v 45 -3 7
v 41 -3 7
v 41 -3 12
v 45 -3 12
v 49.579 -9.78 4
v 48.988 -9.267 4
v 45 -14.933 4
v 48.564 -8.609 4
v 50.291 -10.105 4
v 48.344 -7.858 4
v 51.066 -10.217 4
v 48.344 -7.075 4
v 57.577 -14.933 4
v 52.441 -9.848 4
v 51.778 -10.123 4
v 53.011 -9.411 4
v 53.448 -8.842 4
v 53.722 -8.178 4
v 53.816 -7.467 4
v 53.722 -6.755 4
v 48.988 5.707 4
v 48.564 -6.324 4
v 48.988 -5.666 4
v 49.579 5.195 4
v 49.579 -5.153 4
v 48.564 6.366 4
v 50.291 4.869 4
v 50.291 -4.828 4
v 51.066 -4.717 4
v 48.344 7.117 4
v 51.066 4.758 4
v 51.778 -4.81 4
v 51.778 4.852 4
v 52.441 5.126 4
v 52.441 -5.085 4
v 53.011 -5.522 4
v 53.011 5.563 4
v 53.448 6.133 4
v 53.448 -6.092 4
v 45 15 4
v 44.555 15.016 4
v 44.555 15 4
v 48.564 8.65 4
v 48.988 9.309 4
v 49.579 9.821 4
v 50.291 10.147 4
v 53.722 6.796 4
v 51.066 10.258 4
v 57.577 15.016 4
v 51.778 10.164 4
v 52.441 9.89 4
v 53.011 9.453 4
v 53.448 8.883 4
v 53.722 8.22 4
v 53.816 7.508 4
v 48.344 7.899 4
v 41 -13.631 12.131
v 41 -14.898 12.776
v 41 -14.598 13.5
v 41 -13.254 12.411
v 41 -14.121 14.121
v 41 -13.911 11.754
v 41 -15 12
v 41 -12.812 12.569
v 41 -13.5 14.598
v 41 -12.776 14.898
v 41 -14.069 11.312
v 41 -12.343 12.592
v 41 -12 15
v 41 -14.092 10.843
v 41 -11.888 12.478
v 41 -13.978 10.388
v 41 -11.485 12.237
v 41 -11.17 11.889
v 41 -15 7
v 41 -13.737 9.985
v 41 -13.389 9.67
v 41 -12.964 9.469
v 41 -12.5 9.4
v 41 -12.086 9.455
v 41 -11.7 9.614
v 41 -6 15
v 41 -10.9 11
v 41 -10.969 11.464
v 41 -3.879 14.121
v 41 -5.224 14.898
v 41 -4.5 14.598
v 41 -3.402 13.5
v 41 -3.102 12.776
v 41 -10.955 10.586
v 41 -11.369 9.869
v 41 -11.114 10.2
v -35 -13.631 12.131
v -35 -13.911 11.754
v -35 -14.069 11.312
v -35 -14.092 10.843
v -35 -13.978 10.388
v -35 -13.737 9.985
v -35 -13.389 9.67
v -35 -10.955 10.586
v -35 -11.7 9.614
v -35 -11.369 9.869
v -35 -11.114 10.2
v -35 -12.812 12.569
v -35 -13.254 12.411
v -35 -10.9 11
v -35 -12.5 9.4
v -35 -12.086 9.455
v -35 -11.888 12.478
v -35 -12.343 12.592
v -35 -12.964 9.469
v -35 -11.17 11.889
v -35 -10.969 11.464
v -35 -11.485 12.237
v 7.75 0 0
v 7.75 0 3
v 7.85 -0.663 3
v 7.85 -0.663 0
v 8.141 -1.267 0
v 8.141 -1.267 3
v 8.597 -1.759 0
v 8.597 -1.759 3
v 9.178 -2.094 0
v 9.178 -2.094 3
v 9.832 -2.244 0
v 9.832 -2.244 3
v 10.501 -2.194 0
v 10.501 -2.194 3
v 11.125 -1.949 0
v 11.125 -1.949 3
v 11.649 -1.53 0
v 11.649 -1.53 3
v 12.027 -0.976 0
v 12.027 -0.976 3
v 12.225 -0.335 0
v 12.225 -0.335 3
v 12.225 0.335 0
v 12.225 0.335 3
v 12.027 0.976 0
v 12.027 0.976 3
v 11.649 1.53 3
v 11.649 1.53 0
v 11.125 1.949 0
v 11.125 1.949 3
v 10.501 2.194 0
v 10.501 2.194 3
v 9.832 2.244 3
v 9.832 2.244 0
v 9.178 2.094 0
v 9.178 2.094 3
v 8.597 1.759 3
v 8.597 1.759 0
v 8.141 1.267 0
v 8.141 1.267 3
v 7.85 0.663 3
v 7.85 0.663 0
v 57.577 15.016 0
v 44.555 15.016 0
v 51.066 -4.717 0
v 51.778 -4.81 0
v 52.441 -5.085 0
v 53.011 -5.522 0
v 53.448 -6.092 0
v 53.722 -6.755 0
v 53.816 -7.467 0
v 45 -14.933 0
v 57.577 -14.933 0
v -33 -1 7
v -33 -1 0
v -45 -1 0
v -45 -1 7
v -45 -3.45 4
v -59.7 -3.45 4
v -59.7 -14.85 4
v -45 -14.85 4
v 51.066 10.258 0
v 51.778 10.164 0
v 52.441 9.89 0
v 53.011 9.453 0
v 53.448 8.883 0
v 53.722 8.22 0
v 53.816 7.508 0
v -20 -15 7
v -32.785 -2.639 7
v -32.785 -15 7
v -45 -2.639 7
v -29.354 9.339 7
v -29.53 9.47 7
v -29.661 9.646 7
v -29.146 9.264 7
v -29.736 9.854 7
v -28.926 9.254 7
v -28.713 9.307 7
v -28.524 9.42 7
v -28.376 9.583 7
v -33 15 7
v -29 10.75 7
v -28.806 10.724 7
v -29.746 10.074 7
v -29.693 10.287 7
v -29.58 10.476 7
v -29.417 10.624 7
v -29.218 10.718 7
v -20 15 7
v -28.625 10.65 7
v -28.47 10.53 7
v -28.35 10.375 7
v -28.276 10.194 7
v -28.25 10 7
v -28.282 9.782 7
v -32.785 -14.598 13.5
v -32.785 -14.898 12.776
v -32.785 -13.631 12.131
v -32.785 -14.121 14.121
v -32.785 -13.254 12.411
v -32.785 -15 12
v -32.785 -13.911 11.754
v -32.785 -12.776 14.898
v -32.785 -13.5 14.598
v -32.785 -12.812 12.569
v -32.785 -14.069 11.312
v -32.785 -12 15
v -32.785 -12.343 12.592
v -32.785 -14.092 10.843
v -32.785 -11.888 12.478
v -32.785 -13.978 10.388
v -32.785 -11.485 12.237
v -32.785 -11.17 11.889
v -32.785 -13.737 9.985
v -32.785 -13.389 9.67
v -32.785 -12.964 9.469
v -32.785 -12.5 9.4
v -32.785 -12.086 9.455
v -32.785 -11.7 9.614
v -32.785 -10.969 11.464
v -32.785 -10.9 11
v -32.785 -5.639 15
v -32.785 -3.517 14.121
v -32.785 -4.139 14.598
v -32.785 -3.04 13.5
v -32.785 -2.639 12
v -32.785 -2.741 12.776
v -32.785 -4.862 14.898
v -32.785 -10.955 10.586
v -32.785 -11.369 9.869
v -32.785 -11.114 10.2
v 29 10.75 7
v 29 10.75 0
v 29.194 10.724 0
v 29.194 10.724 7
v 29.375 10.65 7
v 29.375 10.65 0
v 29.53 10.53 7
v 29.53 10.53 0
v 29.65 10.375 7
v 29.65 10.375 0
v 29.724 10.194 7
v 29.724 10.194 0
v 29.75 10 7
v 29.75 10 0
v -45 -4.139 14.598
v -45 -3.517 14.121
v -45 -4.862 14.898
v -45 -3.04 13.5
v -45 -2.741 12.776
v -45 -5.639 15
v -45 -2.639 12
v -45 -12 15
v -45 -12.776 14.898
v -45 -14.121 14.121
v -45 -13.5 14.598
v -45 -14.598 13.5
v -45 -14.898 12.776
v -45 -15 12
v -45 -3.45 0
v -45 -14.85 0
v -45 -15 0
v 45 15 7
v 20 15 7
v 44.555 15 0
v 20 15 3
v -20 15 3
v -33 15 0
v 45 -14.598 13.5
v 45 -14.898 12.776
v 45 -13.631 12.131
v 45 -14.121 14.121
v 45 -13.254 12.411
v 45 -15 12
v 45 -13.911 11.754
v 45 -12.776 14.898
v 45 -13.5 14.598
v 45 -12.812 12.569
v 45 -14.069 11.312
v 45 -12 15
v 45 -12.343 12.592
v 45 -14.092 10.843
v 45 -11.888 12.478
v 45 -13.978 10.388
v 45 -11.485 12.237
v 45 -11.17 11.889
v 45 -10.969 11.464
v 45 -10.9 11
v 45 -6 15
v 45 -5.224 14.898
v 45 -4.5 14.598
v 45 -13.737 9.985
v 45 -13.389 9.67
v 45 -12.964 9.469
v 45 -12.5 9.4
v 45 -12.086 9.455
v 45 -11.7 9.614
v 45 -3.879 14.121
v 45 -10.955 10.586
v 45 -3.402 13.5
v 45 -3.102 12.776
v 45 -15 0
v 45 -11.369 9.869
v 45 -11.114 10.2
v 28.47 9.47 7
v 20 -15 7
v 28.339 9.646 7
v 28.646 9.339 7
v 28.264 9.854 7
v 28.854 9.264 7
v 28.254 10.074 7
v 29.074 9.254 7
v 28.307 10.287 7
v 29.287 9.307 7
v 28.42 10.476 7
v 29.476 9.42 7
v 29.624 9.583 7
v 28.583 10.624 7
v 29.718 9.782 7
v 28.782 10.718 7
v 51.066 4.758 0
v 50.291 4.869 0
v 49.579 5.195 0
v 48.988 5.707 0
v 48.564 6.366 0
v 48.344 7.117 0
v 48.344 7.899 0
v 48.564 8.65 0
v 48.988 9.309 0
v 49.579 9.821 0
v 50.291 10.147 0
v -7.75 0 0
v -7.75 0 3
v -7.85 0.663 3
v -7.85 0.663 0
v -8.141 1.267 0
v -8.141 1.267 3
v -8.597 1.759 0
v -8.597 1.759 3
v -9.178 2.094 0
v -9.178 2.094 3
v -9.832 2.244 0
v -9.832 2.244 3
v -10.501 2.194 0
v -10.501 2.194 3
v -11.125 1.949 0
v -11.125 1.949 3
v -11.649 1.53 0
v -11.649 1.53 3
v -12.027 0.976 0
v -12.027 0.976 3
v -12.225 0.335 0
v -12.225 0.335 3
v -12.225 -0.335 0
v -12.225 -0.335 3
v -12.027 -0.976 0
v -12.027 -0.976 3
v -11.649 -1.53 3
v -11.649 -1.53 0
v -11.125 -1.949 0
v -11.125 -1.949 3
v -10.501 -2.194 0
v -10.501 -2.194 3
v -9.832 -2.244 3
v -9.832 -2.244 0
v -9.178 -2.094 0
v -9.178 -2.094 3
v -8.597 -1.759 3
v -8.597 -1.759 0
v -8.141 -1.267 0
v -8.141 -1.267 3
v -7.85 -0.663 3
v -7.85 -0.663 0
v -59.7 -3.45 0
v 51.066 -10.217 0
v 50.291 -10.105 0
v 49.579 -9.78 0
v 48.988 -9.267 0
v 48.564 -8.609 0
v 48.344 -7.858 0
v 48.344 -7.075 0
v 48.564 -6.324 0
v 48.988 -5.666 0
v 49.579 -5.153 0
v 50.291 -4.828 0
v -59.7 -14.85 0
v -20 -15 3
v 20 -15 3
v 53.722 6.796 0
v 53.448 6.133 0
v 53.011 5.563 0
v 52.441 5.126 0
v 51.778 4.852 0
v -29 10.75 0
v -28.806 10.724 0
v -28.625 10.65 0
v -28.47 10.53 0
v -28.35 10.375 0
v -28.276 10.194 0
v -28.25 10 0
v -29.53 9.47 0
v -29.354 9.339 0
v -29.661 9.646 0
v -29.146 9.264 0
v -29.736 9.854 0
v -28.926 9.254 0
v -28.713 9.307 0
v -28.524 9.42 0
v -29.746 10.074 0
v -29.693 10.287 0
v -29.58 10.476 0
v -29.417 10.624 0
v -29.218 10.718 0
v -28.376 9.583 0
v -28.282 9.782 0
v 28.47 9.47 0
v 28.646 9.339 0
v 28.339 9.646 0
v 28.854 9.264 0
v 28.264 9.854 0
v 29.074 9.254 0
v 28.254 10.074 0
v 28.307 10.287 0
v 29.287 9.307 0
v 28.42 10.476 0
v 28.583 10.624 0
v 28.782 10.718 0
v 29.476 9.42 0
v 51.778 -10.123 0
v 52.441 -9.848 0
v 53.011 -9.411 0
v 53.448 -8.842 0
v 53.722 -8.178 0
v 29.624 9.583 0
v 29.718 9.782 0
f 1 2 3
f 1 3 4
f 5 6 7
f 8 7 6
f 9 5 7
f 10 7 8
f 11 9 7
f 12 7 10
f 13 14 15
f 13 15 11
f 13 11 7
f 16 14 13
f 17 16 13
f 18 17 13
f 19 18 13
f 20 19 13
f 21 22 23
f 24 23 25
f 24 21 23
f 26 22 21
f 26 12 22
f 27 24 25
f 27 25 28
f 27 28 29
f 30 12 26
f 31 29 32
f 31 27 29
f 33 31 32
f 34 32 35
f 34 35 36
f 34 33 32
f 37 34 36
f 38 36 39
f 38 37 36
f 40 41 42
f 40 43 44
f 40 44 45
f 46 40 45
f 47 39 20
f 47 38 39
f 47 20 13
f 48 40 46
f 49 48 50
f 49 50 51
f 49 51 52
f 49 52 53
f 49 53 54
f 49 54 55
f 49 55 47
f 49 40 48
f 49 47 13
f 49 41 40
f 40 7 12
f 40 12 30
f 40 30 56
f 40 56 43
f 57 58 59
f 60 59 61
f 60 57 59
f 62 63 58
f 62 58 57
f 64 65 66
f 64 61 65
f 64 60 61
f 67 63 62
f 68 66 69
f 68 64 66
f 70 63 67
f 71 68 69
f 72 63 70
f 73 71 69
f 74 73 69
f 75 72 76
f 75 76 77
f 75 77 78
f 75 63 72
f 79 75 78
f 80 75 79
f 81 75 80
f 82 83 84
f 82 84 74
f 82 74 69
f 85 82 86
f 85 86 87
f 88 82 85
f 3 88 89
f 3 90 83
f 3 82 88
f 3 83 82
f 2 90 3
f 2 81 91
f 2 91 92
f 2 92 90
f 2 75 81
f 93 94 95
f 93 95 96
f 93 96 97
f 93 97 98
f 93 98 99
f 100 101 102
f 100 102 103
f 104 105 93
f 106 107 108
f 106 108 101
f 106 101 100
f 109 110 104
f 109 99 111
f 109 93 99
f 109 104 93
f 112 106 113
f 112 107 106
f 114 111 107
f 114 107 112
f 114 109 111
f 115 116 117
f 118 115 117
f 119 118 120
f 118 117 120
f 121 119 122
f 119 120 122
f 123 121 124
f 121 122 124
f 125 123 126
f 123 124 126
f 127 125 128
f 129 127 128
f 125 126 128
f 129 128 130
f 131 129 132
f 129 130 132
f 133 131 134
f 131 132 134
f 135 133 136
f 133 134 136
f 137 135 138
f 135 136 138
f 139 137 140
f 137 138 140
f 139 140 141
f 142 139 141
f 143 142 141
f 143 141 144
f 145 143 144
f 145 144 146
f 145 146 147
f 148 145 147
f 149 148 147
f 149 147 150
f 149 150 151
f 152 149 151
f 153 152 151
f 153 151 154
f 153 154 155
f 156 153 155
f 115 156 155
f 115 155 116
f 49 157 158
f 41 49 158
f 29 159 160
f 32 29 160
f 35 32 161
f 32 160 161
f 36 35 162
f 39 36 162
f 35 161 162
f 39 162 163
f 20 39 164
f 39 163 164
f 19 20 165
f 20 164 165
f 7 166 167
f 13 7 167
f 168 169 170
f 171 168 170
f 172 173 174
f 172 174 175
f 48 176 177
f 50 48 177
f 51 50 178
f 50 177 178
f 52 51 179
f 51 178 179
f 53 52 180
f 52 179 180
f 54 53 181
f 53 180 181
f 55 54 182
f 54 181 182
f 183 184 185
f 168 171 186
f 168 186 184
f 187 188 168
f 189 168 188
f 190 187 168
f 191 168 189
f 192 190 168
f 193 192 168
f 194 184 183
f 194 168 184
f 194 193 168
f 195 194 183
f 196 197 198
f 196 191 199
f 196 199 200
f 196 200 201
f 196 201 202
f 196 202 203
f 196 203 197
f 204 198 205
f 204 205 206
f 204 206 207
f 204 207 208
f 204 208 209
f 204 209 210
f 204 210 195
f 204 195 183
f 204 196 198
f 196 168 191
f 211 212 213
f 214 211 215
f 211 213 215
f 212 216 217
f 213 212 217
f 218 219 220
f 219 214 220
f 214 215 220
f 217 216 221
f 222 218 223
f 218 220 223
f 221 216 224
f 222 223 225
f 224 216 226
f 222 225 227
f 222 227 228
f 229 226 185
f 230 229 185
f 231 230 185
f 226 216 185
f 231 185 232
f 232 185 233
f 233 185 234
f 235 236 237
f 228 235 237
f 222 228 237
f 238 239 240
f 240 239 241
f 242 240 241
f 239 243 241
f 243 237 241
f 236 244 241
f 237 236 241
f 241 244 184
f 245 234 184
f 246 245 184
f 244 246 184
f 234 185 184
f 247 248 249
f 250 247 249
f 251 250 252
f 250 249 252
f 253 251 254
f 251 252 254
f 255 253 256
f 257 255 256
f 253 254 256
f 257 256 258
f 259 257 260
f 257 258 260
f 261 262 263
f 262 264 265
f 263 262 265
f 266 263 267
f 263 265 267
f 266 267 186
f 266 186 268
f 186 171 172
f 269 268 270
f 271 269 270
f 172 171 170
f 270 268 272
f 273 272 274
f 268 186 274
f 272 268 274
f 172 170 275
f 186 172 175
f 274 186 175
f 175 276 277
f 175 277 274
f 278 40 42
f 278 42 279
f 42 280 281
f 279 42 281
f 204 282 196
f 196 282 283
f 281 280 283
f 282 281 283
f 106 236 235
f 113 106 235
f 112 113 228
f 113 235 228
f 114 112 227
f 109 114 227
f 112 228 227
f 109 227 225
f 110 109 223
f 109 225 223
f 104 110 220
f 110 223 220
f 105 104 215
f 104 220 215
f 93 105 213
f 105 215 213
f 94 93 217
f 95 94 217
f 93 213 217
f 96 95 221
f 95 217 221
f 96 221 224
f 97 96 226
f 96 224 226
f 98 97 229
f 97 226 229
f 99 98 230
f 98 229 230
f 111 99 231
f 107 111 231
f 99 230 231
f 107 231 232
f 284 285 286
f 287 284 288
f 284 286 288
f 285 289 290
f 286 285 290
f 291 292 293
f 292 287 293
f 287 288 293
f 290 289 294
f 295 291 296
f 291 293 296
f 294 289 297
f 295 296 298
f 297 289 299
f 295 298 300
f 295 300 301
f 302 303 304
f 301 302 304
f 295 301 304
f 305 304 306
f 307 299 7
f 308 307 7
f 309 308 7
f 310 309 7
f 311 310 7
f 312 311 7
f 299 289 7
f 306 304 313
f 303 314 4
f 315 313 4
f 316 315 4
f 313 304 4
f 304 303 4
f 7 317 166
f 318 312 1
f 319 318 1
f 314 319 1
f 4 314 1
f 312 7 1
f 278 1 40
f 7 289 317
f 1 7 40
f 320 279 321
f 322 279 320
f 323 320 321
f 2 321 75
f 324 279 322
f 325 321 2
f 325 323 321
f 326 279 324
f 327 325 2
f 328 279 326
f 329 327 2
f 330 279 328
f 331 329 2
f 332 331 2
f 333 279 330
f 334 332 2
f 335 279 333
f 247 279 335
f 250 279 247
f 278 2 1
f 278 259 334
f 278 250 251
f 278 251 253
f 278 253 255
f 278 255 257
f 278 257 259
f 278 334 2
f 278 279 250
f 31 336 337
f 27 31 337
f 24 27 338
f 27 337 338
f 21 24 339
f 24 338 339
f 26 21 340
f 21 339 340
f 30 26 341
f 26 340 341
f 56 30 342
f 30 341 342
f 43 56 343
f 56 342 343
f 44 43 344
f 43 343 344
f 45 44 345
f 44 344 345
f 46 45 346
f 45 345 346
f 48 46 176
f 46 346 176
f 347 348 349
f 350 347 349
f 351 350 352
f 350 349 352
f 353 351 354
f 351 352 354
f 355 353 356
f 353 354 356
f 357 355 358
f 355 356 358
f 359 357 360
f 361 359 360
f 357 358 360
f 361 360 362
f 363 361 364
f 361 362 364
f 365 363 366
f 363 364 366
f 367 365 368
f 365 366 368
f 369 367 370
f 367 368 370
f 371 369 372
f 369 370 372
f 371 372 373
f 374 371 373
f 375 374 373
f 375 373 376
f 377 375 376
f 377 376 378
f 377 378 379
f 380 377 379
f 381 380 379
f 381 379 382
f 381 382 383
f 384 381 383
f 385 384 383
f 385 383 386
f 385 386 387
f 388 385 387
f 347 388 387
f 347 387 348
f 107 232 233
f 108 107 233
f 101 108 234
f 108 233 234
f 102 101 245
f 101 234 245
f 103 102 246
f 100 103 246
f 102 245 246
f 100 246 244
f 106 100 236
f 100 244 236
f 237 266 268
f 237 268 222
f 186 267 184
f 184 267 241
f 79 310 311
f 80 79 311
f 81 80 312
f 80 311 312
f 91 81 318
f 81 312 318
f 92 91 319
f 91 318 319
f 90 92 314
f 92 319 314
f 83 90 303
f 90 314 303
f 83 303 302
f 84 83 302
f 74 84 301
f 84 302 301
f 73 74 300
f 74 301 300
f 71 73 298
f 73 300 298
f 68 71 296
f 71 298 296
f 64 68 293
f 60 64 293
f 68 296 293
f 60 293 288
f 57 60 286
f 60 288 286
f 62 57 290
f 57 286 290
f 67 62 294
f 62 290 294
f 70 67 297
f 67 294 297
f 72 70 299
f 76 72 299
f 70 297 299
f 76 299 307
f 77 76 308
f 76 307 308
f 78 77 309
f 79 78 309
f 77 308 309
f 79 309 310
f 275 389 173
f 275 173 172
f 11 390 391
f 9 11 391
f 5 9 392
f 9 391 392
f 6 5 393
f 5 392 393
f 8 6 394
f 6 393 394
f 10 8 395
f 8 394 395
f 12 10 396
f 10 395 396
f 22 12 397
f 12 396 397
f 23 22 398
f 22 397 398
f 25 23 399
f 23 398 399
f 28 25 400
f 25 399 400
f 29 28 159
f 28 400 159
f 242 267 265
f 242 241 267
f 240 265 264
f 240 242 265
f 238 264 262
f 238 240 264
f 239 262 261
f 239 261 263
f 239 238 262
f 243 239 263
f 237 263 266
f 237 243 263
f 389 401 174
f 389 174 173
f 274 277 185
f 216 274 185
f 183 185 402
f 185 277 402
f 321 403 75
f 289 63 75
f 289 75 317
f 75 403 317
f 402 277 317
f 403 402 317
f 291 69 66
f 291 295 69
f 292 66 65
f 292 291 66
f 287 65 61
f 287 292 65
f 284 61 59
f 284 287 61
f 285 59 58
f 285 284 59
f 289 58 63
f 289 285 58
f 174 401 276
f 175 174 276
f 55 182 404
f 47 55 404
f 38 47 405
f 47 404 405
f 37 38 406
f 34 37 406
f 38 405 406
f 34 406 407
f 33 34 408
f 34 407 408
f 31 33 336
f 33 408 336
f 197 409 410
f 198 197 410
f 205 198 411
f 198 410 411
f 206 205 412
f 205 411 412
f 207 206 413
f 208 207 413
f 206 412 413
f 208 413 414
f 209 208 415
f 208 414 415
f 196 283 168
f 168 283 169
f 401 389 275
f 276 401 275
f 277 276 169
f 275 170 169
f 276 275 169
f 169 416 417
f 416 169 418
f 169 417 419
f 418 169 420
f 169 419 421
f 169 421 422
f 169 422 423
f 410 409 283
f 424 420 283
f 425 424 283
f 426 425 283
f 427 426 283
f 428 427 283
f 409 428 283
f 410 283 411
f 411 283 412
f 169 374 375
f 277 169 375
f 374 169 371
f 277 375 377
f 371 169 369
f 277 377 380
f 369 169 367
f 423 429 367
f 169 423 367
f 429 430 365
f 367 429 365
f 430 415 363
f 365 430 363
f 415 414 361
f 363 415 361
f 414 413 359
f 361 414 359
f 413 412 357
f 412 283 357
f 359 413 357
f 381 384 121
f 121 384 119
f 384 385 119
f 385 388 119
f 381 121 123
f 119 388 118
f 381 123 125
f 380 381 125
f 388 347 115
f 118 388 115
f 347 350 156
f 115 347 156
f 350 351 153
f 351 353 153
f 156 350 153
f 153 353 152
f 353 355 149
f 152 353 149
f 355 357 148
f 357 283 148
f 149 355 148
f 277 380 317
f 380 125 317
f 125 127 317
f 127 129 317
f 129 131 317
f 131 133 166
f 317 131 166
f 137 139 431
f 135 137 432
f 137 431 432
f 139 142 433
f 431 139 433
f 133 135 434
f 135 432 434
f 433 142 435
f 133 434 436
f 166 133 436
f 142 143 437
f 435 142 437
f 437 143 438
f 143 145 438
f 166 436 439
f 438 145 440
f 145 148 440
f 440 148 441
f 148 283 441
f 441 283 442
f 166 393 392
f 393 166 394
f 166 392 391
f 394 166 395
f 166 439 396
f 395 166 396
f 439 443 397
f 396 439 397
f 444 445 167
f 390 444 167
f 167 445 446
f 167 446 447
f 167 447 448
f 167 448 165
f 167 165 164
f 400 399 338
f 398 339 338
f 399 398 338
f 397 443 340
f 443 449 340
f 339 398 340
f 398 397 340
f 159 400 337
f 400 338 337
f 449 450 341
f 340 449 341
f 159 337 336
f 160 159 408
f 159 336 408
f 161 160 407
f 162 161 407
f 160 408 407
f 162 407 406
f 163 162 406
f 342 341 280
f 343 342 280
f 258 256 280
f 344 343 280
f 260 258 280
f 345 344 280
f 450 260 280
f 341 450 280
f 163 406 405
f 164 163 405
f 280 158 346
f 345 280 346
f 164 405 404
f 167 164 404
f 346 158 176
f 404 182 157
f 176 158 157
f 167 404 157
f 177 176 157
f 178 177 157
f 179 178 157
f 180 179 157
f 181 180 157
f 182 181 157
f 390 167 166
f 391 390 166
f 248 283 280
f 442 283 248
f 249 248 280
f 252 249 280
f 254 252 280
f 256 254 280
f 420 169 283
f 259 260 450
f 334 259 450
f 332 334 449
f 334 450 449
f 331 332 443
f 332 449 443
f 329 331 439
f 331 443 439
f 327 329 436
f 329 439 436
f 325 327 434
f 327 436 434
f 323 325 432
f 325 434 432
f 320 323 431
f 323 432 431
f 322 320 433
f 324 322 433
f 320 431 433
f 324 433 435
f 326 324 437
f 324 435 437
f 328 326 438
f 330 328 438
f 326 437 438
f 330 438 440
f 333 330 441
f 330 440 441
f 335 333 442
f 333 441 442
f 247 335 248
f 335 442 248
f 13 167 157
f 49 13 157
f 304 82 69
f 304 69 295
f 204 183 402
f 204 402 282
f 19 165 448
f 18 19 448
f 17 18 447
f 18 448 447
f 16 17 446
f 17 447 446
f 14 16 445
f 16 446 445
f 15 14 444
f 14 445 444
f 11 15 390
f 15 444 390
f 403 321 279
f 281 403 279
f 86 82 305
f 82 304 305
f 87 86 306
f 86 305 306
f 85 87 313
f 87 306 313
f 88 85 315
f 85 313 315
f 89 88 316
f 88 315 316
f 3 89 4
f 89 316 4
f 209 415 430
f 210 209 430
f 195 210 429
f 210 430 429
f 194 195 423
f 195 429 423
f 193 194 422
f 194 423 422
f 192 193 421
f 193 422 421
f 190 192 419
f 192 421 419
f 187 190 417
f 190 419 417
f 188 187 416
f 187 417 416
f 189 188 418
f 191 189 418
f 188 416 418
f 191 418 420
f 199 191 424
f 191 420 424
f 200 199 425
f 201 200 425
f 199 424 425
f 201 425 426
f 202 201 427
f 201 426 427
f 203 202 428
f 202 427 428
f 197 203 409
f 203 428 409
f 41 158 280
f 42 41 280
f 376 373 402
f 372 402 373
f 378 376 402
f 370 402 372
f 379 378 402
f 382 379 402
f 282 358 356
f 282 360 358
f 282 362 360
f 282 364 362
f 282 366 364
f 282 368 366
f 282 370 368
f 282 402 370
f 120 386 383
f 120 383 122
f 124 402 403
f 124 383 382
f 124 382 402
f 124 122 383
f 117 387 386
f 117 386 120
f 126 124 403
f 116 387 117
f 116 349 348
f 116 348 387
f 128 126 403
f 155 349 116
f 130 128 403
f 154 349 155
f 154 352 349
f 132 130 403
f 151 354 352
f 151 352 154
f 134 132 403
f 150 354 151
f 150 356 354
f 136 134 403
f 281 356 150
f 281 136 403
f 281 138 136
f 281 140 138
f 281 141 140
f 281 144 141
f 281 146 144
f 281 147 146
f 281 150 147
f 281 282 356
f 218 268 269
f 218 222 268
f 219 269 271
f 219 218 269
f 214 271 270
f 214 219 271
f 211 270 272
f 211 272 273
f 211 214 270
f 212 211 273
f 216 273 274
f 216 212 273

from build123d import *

# Parameters (mm, degrees)
F1_DEPTH  = 7
F2_W      = 4
F2_H      = 12
F3_DEPTH  = 8
F4_W      = 12.2146774828
F4_H      = 1.6385169476
F5_DEPTH  = 8
F7_DEPTH  = 80
F8_R      = 2.25
F9_DEPTH  = 25
F10_W     = 40
F10_H     = 30
F10_R     = 2.25
F11_DEPTH = 4
F12_R     = 3
F14_DEPTH = 4
F15_W     = 15
F15_H     = 11.3999997266
F16_DEPTH = 4


with BuildPart() as f1:
    # F0 (on Top) → F1 (new body)
    with BuildSketch(Plane.XY):
        Polygon((-29, 15), (-33, 15), (-33, -1), (-45, -1), (-45, -15), (45, -15), (45, 15), (29, 15), align=None)
        with BuildLine():
            ThreePointArc((-28.25, 10), (-29.5303300859, 9.4696699141), (-29, 10.75))
            ThreePointArc((-29, 10.75), (-28.4696699141, 10.5303300859), (-28.25, 10))
        make_face(mode=Mode.SUBTRACT)
        with BuildLine():
            ThreePointArc((29.75, 10), (28.4696699141, 9.4696699141), (29, 10.75))
            ThreePointArc((29, 10.75), (29.5303300859, 10.5303300859), (29.75, 10))
        make_face(mode=Mode.SUBTRACT)
    extrude(amount=F1_DEPTH)

    # F2 (on face) → F3 (join)
    with BuildSketch(Plane.XY.offset(7)):
        Polygon((-33, -1), (-45, -1), (-45, -15), (-32.7853225172, -15), (-32.7853225172, -1), align=None)
        with Locations((43, -9)):
            Rectangle(F2_W, F2_H)
    extrude(amount=F3_DEPTH)

    # F4 (on face) → F5 (cut)
    with BuildSketch(Plane.XY.offset(15)):
        with Locations((-38.8926612586, -1.8192584738)):
            Rectangle(F4_W, F4_H)
    extrude(amount=-F5_DEPTH, mode=Mode.SUBTRACT)

    # F6 (on face) → F7 (cut)
    with BuildSketch(Plane.YZ.offset(45)):
        with BuildLine():
            ThreePointArc((-12.5, 9.4), (-11.3686291501, 9.8686291501), (-10.9, 11))
            ThreePointArc((-10.9, 11), (-13.6313708499, 12.1313708499), (-12.5, 9.4))
        make_face()
    extrude(amount=-F7_DEPTH, mode=Mode.SUBTRACT)

    # F8 (on face) → F9 (cut)
    with BuildSketch(Plane.XY.offset(7)):
        with Locations((-10, 0)):
            Circle(F8_R)
        with BuildLine():
            ThreePointArc((12.25, 0), (10, 2.25), (7.75, 0))
            ThreePointArc((7.75, 0), (10, -2.25), (12.25, 0))
        make_face()
    extrude(amount=-F9_DEPTH, mode=Mode.SUBTRACT)

    # F10 (on face) → F11 (cut)
    with BuildSketch(Plane.XY.offset(7)):
        Rectangle(F10_W, F10_H)
        with Locations((-10, 0)):
            Circle(F10_R, mode=Mode.SUBTRACT)
        with Locations((10, 0)):
            Circle(F10_R, mode=Mode.SUBTRACT)
    extrude(amount=-F11_DEPTH, mode=Mode.SUBTRACT)

    # F12
    f12_edges = [f1.edges().sort_by_distance(p)[0] for p in [
        (-38.892661, -15, 15),
        (43, -15, 15),
        (-38.892661, -2.638517, 15),
        (43, -3, 15),
    ]]
    fillet(f12_edges, radius=F12_R)

    # F13 (on Top) → F14 (join)
    with BuildSketch(Plane.XY):
        with BuildLine():
            Line((57.5766451657, 15.0159569457), (51.0659832507, 15.0159569457))
            Line((51.0659832507, 15.0159569457), (51.0659832507, 10.2579784729))
            ThreePointArc((51.0659832507, 10.2579784729), (53.010526899, 9.4525221211), (53.8159832507, 7.5079784729))
            ThreePointArc((53.8159832507, 7.5079784729), (53.010526899, 5.5634348246), (51.0659832507, 4.7579784729))
            Line((51.0659832507, 4.7579784729), (51.0659832507, 0))
            Line((51.0659832507, 0), (51.0659832507, -4.7165443972))
            ThreePointArc((51.0659832507, -4.7165443972), (53.010526899, -5.5220007489), (53.8159832507, -7.4665443972))
            ThreePointArc((53.8159832507, -7.4665443972), (53.010526899, -9.4110880454), (51.0659832507, -10.2165443972))
            Line((51.0659832507, -10.2165443972), (51.0659832507, -14.9330887944))
            Line((51.0659832507, -14.9330887944), (57.5766451657, -14.9330887944))
            Line((57.5766451657, -14.9330887944), (57.5766451657, 15.0159569457))
        make_face()
        with BuildLine():
            Line((51.0659832507, 15.0159569457), (44.5553213358, 15.0159569457))
            Line((44.5553213358, 15.0159569457), (44.5553213358, -14.9330887944))
            Line((44.5553213358, -14.9330887944), (51.0659832507, -14.9330887944))
            Line((51.0659832507, -14.9330887944), (51.0659832507, -10.2165443972))
            ThreePointArc((51.0659832507, -10.2165443972), (48.3159832507, -7.4665443972), (51.0659832507, -4.7165443972))
            Line((51.0659832507, -4.7165443972), (51.0659832507, 0))
            Line((51.0659832507, 0), (51.0659832507, 4.7579784729))
            ThreePointArc((51.0659832507, 4.7579784729), (48.3159832507, 7.5079784729), (51.0659832507, 10.2579784729))
            Line((51.0659832507, 10.2579784729), (51.0659832507, 15.0159569457))
        make_face()
    extrude(amount=F14_DEPTH)

    # F15 (on Top) → F16 (join)
    with BuildSketch(Plane.XY):
        with Locations((-52.2000010312, -9.1500000563)):
            Rectangle(F15_W, F15_H)
    extrude(amount=F16_DEPTH)


solid = f1.part
